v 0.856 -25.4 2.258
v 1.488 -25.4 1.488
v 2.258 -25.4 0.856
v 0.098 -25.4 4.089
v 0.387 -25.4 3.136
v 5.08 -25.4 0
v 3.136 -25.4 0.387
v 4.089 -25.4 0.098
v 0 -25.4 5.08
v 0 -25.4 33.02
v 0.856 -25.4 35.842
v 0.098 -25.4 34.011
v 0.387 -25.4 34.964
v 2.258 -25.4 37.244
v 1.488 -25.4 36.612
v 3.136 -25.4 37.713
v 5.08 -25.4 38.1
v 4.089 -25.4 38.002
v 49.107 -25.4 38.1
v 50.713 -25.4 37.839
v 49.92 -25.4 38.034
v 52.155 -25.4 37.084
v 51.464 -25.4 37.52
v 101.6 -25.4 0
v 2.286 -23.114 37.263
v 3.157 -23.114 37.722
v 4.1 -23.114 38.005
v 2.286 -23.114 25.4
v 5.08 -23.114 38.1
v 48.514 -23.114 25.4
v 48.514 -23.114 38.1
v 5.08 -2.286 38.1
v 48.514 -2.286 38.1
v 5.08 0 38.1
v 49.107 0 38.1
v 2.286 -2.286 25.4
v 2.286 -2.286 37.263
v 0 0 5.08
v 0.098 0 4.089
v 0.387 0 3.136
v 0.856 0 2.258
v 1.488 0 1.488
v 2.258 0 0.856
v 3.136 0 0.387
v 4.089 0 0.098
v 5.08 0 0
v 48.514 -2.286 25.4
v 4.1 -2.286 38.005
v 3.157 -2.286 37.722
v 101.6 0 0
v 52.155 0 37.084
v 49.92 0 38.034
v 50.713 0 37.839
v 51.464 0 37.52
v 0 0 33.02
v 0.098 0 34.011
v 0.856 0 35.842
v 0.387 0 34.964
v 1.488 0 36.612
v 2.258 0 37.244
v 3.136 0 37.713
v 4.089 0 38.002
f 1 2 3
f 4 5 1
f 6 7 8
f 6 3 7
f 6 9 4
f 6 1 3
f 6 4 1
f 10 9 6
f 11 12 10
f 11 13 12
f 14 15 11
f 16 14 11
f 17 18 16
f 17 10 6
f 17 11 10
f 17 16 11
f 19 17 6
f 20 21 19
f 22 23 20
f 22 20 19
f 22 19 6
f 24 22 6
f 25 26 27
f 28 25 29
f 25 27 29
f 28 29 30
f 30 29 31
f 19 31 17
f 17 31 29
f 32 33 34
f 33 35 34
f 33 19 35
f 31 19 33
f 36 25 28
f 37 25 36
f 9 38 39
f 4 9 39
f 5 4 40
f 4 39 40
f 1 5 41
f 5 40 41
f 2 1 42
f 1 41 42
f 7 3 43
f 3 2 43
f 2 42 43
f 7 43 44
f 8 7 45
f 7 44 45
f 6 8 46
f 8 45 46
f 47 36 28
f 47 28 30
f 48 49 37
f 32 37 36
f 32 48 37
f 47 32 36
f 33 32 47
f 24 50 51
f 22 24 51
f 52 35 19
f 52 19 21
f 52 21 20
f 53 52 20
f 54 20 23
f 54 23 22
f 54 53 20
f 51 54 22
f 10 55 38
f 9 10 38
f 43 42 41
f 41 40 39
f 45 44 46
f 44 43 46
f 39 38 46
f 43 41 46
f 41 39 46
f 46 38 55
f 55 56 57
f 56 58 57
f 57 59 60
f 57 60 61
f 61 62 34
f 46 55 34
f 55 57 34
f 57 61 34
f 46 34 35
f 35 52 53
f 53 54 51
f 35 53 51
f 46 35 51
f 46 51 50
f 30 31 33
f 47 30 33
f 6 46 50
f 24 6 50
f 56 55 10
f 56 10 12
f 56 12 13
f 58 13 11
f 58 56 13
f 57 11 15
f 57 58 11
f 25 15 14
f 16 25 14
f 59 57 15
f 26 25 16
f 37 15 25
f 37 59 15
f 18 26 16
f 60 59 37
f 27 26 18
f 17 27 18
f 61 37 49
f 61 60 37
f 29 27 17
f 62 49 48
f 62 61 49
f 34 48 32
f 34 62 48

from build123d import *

# Parameters (mm, degrees)
F1_DEPTH    = 25.4
F2_W        = 46.228
F2_H        = 20.828
F3_DEPTH    = 12.7
F4_T1_DEPTH = 50.8
F4_T3_DEPTH = 33.8666666667


# Not quite as in the source:
# - a fillet or chamfer that OpenCascade refuses, or shapes differently, is made with other operations: its cross-section is extruded or revolved along the edge and cut away or added


with BuildPart() as f1:
    # F0 (on Front) → F1 (new body)
    with BuildSketch(Plane.XZ):
        Polygon((0, 38.1), (0, 0), (101.6, 0), (50.8, 38.1), align=None)
    extrude(amount=F1_DEPTH)

    # F2 (on face) → F3 (cut)
    with BuildSketch(Plane.XY.offset(38.1)):
        with Locations((25.4, -12.7)):
            Rectangle(F2_W, F2_H)
    extrude(amount=-F3_DEPTH, mode=Mode.SUBTRACT)

    # F4: fillet of radius 5.08 on 3 edges, made by hand

    # F4_s2 → F4_t1 (cut)
    with BuildSketch(Plane.XZ.offset(-12.7)):
        with BuildLine():
            ThreePointArc((0, 33.02), (1.4878975516, 36.6121024484), (5.08, 38.1))
            Line((5.08, 38.1), (0, 38.1))
            Line((0, 38.1), (0, 33.02))
        make_face()
        with BuildLine():
            ThreePointArc((0, 5.08), (1.4878975516, 1.4878975516), (5.08, 0))
            Line((5.08, 0), (0, 0))
            Line((0, 0), (0, 5.08))
        make_face()
    extrude(amount=F4_T1_DEPTH, mode=Mode.SUBTRACT)

    # F4_s4 → F4_t3 (cut)
    with BuildSketch(Plane.XZ.offset(-4.2333333333)):
        with BuildLine():
            ThreePointArc((49.1066666667, 38.1), (50.713103718, 37.8393111541), (52.1546666667, 37.084))
            Line((52.1546666667, 37.084), (50.8, 38.1))
            Line((50.8, 38.1), (49.1066666667, 38.1))
        make_face()
    extrude(amount=F4_T3_DEPTH, mode=Mode.SUBTRACT)


solid = f1.part
